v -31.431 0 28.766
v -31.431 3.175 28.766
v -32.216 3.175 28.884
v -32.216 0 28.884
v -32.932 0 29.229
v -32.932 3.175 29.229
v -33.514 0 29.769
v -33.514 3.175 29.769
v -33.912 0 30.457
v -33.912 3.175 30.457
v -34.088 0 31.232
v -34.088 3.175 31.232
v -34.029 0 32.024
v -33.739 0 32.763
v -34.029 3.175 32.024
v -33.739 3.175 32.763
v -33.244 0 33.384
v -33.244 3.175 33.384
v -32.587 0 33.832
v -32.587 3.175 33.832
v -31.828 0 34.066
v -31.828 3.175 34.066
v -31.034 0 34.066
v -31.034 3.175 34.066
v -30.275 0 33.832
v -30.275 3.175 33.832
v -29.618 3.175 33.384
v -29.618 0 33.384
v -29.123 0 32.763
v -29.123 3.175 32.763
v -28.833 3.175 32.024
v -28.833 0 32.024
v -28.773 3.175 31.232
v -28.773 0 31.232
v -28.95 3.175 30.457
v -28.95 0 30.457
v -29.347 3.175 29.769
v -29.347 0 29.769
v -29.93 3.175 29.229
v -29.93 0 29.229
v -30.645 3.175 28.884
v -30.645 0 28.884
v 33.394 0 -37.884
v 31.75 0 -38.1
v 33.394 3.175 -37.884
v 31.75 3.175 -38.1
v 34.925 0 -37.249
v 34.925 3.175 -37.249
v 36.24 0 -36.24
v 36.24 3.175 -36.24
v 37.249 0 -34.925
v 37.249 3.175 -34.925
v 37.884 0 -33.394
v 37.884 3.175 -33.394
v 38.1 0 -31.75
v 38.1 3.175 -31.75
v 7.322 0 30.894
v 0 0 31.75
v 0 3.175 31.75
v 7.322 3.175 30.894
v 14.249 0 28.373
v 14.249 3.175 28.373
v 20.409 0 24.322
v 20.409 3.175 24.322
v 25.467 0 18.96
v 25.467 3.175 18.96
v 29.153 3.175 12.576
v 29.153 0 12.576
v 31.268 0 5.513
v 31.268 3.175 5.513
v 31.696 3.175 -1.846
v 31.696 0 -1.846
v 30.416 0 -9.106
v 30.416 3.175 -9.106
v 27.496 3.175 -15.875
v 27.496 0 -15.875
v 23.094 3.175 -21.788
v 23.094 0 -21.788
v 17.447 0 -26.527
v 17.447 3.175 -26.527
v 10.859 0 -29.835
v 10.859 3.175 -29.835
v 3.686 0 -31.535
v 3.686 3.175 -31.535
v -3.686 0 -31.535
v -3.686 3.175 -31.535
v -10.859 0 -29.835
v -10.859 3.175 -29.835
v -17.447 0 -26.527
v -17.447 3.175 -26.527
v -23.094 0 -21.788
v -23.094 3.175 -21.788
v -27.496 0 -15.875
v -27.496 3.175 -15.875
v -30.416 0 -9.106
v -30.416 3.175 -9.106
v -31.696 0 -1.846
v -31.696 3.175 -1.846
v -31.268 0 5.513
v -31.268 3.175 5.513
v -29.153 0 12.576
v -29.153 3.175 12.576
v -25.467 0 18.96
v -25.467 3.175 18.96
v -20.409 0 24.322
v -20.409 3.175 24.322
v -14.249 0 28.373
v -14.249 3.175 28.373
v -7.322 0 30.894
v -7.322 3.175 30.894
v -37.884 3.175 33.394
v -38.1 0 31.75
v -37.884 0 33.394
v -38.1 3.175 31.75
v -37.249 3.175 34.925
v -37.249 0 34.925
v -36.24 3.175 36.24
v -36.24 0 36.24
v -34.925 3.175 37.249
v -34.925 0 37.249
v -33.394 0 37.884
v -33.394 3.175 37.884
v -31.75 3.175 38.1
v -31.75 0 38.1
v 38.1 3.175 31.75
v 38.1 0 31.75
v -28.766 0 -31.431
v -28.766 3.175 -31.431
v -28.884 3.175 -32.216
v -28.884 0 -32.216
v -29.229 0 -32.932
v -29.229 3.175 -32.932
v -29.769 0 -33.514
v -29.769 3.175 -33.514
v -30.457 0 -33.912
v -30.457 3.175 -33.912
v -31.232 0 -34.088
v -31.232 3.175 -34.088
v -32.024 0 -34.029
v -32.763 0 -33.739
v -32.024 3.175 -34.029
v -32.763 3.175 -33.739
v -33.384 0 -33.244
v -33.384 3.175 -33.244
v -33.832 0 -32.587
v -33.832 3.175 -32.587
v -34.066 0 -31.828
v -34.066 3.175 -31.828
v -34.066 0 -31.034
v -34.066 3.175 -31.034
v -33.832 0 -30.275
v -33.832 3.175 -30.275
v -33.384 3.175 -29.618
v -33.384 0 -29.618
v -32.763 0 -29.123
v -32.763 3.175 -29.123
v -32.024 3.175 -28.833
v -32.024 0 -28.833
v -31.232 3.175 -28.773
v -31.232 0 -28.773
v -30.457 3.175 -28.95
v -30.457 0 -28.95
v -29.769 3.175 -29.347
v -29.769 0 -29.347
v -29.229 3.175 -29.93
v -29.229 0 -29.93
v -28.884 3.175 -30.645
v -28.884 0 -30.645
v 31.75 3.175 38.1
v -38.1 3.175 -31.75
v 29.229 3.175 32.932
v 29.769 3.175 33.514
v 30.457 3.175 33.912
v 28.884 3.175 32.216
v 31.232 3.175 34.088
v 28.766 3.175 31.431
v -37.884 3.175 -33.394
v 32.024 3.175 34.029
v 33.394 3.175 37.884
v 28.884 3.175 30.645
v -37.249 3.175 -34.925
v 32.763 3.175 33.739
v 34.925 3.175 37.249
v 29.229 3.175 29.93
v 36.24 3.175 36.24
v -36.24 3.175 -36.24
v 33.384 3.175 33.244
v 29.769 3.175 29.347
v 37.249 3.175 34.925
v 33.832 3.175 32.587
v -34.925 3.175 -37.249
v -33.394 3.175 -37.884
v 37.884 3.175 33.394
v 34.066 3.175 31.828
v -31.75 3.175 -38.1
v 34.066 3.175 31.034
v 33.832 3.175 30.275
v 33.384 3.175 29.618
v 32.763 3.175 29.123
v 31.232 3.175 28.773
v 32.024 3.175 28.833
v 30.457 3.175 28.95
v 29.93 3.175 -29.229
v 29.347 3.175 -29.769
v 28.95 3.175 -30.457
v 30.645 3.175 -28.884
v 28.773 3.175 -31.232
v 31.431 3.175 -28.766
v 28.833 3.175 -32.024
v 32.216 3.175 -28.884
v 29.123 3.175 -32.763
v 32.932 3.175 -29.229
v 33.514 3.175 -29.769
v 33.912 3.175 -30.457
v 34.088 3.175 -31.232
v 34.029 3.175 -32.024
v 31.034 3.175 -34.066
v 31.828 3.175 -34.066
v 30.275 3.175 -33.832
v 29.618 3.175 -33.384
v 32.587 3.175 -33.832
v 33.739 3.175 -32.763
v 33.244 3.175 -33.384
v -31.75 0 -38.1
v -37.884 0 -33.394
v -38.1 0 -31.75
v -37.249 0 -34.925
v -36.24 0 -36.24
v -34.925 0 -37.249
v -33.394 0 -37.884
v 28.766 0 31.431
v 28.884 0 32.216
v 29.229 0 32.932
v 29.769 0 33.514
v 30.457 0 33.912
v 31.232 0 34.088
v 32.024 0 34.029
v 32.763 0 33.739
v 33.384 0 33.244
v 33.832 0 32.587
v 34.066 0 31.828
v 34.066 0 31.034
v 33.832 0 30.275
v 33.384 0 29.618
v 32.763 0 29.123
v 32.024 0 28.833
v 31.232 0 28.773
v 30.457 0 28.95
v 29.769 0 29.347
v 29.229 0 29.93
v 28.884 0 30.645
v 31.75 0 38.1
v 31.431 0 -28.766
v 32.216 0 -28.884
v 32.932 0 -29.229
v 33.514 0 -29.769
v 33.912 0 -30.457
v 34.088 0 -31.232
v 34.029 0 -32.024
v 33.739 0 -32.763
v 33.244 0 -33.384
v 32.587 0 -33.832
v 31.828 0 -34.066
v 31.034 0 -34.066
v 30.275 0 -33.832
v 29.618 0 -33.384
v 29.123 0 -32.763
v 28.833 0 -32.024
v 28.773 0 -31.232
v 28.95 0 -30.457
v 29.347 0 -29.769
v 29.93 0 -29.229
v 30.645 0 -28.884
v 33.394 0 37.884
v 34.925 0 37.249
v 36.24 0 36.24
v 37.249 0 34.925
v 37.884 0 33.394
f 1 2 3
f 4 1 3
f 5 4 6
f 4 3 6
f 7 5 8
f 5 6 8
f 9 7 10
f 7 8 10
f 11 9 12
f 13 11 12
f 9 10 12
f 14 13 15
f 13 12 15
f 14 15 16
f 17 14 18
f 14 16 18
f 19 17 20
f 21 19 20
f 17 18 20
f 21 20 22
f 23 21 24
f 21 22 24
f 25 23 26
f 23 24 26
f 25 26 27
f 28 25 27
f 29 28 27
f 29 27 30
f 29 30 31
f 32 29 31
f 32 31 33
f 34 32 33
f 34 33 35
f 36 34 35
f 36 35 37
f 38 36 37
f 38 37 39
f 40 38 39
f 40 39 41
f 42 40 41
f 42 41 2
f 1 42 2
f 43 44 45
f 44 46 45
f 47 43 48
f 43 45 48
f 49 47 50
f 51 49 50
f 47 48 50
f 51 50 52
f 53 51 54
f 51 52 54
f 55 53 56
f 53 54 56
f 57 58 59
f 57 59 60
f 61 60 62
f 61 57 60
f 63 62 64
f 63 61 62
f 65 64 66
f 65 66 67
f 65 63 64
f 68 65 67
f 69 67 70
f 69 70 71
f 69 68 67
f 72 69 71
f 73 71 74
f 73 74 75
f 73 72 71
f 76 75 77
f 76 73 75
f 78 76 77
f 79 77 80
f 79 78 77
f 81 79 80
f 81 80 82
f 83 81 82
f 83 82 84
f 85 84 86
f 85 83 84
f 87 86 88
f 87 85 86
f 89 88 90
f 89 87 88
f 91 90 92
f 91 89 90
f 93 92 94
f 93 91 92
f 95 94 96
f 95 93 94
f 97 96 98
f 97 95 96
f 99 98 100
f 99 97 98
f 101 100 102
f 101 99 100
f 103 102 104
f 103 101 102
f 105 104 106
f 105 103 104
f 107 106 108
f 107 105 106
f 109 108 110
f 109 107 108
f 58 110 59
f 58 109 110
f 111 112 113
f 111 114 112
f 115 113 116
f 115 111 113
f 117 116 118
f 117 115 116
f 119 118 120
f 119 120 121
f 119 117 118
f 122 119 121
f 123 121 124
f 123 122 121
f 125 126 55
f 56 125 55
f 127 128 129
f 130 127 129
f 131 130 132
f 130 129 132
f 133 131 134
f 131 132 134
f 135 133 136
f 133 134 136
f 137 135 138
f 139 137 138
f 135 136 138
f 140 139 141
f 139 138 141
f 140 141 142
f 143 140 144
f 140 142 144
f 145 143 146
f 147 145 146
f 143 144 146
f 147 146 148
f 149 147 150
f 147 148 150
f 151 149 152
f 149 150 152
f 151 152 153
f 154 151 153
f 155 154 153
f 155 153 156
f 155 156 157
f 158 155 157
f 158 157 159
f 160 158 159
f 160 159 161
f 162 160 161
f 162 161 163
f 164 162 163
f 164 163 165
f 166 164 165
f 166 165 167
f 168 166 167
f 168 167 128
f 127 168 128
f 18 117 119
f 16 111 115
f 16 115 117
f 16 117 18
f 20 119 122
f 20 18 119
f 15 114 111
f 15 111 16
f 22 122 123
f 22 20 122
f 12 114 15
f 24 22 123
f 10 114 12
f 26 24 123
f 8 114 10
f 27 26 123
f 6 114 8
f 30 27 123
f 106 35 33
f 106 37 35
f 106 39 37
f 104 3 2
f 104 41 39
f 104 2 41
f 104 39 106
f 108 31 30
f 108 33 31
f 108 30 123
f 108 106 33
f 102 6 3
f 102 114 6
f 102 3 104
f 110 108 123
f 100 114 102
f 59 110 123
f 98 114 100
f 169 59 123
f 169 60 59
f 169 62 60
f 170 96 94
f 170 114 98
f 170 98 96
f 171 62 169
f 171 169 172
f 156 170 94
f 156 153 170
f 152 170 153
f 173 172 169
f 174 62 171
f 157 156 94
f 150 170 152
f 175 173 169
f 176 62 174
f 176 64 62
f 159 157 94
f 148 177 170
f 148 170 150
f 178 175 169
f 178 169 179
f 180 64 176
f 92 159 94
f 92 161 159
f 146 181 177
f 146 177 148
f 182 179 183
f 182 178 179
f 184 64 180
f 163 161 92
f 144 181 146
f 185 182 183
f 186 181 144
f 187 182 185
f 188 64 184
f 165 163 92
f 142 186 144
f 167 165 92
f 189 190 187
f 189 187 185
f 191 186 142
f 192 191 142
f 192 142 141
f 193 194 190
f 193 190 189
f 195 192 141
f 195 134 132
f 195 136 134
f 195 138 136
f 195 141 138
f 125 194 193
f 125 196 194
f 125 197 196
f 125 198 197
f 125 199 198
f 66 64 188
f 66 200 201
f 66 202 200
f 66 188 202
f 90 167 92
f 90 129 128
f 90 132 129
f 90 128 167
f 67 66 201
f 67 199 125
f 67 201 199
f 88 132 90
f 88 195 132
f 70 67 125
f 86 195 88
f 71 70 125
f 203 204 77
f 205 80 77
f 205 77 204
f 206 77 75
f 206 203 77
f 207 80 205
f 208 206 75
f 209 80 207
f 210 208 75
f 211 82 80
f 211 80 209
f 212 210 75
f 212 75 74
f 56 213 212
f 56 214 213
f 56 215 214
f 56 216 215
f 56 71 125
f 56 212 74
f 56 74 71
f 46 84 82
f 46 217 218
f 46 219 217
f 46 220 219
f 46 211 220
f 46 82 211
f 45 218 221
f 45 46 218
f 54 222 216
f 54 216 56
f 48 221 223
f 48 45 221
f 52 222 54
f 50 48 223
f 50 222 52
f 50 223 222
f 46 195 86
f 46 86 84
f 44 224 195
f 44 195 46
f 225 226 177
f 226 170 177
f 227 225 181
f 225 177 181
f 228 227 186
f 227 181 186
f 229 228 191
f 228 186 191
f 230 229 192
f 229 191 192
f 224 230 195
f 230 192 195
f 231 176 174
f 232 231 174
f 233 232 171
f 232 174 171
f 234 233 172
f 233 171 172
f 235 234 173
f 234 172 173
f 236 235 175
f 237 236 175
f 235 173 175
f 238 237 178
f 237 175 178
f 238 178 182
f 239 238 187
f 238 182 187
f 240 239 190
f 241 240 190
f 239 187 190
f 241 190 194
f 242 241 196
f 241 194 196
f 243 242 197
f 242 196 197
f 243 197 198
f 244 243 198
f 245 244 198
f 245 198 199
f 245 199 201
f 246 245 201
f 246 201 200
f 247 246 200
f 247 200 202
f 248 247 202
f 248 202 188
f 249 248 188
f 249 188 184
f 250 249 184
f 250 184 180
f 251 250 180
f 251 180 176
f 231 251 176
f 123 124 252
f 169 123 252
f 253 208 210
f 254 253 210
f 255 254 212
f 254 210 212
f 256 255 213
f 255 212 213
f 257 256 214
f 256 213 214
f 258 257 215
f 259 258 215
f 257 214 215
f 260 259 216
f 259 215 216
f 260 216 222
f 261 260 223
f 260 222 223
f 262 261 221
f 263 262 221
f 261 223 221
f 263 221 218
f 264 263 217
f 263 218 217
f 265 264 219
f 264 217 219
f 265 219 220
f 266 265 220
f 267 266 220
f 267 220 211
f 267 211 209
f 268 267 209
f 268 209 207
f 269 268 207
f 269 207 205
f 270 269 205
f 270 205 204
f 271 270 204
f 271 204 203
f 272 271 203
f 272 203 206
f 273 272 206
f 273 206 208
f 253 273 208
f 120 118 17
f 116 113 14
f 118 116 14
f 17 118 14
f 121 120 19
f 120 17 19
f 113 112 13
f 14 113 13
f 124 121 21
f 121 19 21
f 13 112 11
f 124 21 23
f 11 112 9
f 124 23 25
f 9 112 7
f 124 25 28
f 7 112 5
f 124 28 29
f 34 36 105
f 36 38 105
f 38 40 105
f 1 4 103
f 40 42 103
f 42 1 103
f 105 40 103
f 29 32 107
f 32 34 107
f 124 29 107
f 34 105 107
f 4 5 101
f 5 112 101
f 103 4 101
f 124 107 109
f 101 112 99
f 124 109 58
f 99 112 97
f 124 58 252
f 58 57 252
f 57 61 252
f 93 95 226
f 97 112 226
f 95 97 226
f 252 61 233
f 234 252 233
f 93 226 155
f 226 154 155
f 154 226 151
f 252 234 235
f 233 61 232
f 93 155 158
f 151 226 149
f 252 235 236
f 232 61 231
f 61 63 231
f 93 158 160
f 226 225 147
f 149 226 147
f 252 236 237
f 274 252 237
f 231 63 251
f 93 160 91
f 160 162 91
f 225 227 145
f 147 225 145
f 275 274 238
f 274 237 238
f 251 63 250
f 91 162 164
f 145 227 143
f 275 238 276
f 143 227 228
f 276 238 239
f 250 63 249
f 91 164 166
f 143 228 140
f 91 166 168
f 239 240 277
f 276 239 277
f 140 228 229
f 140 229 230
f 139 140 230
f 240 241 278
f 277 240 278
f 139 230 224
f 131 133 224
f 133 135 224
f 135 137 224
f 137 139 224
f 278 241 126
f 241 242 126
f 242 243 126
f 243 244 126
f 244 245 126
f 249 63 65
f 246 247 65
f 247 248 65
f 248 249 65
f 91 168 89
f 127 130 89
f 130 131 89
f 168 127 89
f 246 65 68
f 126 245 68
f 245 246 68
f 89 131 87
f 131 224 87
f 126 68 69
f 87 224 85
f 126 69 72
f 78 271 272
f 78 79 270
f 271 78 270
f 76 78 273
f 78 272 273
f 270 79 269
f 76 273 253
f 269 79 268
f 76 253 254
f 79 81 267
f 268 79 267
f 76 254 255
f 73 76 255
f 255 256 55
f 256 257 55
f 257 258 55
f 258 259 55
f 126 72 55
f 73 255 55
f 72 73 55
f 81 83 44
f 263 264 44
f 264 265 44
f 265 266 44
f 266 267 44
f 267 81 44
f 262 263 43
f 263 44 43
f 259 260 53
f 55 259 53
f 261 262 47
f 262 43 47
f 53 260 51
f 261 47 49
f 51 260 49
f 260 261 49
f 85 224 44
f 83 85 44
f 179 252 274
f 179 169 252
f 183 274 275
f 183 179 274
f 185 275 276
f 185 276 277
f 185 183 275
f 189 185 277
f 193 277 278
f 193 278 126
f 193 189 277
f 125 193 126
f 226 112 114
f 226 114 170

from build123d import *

# Parameters (mm, degrees)
SKETCH1_W           = 76.2
SKETCH1_H           = 76.2
SKETCH1_R           = 31.75
BOSS_EXTRUDE1_DEPTH = 3.175
CUT_EXTRUDE1_REACH  = 55.975
SKETCH2_R           = 2.665
CIRPATTERN1_COUNT   = 4
FILLET1_R           = 6.35


with BuildPart() as part:
    # Sketch1 → Boss-Extrude1 (new body)
    with BuildSketch(Plane(origin=(0, 0, 0), x_dir=(1, 0, 0), z_dir=(0, 1, 0))):
        Rectangle(SKETCH1_W, SKETCH1_H)
        with Locations(Location((0, 0, 0), (0, 0, 270))):
            Circle(SKETCH1_R, mode=Mode.SUBTRACT)
    extrude(amount=BOSS_EXTRUDE1_DEPTH)

    # Sketch2 → Cut-Extrude1 (cut, up to next)
    with BuildSketch(Plane(origin=(0, 3.175, 0), x_dir=(1, 0, 0), z_dir=(0, 1, 0)), mode=Mode.PRIVATE) as cut_extrude1_sk1:
        with Locations(Location((31.430896424, 31.430896424, 0), (0, 0, 270))):
            Circle(SKETCH2_R)
    cut_extrude1_tool1 = extrude(cut_extrude1_sk1.sketch, amount=-CUT_EXTRUDE1_REACH, mode=Mode.PRIVATE) & part.part
    cut_extrude1 = cut_extrude1_tool1.solids().sort_by_distance((31.430896, 3.175, -31.430896))[0]
    add(cut_extrude1, mode=Mode.SUBTRACT)

    # CirPattern1: Cut-Extrude1 ×4 about axis
    cirpattern1_axis = Axis((0, 0, 0), (0, 1, 0))
    for i in range(1, CIRPATTERN1_COUNT):
        add(cut_extrude1.rotate(cirpattern1_axis, i * 360 / CIRPATTERN1_COUNT), mode=Mode.SUBTRACT)

    # Fillet1
    fillet1_edges = [part.edges().sort_by_distance(p)[0] for p in [
        (38.1, 1.5875, 38.1),
        (-38.1, 1.5875, 38.1),
        (-38.1, 1.5875, -38.1),
        (38.1, 1.5875, -38.1),
    ]]
    fillet(fillet1_edges, radius=FILLET1_R)


solid = part.part
